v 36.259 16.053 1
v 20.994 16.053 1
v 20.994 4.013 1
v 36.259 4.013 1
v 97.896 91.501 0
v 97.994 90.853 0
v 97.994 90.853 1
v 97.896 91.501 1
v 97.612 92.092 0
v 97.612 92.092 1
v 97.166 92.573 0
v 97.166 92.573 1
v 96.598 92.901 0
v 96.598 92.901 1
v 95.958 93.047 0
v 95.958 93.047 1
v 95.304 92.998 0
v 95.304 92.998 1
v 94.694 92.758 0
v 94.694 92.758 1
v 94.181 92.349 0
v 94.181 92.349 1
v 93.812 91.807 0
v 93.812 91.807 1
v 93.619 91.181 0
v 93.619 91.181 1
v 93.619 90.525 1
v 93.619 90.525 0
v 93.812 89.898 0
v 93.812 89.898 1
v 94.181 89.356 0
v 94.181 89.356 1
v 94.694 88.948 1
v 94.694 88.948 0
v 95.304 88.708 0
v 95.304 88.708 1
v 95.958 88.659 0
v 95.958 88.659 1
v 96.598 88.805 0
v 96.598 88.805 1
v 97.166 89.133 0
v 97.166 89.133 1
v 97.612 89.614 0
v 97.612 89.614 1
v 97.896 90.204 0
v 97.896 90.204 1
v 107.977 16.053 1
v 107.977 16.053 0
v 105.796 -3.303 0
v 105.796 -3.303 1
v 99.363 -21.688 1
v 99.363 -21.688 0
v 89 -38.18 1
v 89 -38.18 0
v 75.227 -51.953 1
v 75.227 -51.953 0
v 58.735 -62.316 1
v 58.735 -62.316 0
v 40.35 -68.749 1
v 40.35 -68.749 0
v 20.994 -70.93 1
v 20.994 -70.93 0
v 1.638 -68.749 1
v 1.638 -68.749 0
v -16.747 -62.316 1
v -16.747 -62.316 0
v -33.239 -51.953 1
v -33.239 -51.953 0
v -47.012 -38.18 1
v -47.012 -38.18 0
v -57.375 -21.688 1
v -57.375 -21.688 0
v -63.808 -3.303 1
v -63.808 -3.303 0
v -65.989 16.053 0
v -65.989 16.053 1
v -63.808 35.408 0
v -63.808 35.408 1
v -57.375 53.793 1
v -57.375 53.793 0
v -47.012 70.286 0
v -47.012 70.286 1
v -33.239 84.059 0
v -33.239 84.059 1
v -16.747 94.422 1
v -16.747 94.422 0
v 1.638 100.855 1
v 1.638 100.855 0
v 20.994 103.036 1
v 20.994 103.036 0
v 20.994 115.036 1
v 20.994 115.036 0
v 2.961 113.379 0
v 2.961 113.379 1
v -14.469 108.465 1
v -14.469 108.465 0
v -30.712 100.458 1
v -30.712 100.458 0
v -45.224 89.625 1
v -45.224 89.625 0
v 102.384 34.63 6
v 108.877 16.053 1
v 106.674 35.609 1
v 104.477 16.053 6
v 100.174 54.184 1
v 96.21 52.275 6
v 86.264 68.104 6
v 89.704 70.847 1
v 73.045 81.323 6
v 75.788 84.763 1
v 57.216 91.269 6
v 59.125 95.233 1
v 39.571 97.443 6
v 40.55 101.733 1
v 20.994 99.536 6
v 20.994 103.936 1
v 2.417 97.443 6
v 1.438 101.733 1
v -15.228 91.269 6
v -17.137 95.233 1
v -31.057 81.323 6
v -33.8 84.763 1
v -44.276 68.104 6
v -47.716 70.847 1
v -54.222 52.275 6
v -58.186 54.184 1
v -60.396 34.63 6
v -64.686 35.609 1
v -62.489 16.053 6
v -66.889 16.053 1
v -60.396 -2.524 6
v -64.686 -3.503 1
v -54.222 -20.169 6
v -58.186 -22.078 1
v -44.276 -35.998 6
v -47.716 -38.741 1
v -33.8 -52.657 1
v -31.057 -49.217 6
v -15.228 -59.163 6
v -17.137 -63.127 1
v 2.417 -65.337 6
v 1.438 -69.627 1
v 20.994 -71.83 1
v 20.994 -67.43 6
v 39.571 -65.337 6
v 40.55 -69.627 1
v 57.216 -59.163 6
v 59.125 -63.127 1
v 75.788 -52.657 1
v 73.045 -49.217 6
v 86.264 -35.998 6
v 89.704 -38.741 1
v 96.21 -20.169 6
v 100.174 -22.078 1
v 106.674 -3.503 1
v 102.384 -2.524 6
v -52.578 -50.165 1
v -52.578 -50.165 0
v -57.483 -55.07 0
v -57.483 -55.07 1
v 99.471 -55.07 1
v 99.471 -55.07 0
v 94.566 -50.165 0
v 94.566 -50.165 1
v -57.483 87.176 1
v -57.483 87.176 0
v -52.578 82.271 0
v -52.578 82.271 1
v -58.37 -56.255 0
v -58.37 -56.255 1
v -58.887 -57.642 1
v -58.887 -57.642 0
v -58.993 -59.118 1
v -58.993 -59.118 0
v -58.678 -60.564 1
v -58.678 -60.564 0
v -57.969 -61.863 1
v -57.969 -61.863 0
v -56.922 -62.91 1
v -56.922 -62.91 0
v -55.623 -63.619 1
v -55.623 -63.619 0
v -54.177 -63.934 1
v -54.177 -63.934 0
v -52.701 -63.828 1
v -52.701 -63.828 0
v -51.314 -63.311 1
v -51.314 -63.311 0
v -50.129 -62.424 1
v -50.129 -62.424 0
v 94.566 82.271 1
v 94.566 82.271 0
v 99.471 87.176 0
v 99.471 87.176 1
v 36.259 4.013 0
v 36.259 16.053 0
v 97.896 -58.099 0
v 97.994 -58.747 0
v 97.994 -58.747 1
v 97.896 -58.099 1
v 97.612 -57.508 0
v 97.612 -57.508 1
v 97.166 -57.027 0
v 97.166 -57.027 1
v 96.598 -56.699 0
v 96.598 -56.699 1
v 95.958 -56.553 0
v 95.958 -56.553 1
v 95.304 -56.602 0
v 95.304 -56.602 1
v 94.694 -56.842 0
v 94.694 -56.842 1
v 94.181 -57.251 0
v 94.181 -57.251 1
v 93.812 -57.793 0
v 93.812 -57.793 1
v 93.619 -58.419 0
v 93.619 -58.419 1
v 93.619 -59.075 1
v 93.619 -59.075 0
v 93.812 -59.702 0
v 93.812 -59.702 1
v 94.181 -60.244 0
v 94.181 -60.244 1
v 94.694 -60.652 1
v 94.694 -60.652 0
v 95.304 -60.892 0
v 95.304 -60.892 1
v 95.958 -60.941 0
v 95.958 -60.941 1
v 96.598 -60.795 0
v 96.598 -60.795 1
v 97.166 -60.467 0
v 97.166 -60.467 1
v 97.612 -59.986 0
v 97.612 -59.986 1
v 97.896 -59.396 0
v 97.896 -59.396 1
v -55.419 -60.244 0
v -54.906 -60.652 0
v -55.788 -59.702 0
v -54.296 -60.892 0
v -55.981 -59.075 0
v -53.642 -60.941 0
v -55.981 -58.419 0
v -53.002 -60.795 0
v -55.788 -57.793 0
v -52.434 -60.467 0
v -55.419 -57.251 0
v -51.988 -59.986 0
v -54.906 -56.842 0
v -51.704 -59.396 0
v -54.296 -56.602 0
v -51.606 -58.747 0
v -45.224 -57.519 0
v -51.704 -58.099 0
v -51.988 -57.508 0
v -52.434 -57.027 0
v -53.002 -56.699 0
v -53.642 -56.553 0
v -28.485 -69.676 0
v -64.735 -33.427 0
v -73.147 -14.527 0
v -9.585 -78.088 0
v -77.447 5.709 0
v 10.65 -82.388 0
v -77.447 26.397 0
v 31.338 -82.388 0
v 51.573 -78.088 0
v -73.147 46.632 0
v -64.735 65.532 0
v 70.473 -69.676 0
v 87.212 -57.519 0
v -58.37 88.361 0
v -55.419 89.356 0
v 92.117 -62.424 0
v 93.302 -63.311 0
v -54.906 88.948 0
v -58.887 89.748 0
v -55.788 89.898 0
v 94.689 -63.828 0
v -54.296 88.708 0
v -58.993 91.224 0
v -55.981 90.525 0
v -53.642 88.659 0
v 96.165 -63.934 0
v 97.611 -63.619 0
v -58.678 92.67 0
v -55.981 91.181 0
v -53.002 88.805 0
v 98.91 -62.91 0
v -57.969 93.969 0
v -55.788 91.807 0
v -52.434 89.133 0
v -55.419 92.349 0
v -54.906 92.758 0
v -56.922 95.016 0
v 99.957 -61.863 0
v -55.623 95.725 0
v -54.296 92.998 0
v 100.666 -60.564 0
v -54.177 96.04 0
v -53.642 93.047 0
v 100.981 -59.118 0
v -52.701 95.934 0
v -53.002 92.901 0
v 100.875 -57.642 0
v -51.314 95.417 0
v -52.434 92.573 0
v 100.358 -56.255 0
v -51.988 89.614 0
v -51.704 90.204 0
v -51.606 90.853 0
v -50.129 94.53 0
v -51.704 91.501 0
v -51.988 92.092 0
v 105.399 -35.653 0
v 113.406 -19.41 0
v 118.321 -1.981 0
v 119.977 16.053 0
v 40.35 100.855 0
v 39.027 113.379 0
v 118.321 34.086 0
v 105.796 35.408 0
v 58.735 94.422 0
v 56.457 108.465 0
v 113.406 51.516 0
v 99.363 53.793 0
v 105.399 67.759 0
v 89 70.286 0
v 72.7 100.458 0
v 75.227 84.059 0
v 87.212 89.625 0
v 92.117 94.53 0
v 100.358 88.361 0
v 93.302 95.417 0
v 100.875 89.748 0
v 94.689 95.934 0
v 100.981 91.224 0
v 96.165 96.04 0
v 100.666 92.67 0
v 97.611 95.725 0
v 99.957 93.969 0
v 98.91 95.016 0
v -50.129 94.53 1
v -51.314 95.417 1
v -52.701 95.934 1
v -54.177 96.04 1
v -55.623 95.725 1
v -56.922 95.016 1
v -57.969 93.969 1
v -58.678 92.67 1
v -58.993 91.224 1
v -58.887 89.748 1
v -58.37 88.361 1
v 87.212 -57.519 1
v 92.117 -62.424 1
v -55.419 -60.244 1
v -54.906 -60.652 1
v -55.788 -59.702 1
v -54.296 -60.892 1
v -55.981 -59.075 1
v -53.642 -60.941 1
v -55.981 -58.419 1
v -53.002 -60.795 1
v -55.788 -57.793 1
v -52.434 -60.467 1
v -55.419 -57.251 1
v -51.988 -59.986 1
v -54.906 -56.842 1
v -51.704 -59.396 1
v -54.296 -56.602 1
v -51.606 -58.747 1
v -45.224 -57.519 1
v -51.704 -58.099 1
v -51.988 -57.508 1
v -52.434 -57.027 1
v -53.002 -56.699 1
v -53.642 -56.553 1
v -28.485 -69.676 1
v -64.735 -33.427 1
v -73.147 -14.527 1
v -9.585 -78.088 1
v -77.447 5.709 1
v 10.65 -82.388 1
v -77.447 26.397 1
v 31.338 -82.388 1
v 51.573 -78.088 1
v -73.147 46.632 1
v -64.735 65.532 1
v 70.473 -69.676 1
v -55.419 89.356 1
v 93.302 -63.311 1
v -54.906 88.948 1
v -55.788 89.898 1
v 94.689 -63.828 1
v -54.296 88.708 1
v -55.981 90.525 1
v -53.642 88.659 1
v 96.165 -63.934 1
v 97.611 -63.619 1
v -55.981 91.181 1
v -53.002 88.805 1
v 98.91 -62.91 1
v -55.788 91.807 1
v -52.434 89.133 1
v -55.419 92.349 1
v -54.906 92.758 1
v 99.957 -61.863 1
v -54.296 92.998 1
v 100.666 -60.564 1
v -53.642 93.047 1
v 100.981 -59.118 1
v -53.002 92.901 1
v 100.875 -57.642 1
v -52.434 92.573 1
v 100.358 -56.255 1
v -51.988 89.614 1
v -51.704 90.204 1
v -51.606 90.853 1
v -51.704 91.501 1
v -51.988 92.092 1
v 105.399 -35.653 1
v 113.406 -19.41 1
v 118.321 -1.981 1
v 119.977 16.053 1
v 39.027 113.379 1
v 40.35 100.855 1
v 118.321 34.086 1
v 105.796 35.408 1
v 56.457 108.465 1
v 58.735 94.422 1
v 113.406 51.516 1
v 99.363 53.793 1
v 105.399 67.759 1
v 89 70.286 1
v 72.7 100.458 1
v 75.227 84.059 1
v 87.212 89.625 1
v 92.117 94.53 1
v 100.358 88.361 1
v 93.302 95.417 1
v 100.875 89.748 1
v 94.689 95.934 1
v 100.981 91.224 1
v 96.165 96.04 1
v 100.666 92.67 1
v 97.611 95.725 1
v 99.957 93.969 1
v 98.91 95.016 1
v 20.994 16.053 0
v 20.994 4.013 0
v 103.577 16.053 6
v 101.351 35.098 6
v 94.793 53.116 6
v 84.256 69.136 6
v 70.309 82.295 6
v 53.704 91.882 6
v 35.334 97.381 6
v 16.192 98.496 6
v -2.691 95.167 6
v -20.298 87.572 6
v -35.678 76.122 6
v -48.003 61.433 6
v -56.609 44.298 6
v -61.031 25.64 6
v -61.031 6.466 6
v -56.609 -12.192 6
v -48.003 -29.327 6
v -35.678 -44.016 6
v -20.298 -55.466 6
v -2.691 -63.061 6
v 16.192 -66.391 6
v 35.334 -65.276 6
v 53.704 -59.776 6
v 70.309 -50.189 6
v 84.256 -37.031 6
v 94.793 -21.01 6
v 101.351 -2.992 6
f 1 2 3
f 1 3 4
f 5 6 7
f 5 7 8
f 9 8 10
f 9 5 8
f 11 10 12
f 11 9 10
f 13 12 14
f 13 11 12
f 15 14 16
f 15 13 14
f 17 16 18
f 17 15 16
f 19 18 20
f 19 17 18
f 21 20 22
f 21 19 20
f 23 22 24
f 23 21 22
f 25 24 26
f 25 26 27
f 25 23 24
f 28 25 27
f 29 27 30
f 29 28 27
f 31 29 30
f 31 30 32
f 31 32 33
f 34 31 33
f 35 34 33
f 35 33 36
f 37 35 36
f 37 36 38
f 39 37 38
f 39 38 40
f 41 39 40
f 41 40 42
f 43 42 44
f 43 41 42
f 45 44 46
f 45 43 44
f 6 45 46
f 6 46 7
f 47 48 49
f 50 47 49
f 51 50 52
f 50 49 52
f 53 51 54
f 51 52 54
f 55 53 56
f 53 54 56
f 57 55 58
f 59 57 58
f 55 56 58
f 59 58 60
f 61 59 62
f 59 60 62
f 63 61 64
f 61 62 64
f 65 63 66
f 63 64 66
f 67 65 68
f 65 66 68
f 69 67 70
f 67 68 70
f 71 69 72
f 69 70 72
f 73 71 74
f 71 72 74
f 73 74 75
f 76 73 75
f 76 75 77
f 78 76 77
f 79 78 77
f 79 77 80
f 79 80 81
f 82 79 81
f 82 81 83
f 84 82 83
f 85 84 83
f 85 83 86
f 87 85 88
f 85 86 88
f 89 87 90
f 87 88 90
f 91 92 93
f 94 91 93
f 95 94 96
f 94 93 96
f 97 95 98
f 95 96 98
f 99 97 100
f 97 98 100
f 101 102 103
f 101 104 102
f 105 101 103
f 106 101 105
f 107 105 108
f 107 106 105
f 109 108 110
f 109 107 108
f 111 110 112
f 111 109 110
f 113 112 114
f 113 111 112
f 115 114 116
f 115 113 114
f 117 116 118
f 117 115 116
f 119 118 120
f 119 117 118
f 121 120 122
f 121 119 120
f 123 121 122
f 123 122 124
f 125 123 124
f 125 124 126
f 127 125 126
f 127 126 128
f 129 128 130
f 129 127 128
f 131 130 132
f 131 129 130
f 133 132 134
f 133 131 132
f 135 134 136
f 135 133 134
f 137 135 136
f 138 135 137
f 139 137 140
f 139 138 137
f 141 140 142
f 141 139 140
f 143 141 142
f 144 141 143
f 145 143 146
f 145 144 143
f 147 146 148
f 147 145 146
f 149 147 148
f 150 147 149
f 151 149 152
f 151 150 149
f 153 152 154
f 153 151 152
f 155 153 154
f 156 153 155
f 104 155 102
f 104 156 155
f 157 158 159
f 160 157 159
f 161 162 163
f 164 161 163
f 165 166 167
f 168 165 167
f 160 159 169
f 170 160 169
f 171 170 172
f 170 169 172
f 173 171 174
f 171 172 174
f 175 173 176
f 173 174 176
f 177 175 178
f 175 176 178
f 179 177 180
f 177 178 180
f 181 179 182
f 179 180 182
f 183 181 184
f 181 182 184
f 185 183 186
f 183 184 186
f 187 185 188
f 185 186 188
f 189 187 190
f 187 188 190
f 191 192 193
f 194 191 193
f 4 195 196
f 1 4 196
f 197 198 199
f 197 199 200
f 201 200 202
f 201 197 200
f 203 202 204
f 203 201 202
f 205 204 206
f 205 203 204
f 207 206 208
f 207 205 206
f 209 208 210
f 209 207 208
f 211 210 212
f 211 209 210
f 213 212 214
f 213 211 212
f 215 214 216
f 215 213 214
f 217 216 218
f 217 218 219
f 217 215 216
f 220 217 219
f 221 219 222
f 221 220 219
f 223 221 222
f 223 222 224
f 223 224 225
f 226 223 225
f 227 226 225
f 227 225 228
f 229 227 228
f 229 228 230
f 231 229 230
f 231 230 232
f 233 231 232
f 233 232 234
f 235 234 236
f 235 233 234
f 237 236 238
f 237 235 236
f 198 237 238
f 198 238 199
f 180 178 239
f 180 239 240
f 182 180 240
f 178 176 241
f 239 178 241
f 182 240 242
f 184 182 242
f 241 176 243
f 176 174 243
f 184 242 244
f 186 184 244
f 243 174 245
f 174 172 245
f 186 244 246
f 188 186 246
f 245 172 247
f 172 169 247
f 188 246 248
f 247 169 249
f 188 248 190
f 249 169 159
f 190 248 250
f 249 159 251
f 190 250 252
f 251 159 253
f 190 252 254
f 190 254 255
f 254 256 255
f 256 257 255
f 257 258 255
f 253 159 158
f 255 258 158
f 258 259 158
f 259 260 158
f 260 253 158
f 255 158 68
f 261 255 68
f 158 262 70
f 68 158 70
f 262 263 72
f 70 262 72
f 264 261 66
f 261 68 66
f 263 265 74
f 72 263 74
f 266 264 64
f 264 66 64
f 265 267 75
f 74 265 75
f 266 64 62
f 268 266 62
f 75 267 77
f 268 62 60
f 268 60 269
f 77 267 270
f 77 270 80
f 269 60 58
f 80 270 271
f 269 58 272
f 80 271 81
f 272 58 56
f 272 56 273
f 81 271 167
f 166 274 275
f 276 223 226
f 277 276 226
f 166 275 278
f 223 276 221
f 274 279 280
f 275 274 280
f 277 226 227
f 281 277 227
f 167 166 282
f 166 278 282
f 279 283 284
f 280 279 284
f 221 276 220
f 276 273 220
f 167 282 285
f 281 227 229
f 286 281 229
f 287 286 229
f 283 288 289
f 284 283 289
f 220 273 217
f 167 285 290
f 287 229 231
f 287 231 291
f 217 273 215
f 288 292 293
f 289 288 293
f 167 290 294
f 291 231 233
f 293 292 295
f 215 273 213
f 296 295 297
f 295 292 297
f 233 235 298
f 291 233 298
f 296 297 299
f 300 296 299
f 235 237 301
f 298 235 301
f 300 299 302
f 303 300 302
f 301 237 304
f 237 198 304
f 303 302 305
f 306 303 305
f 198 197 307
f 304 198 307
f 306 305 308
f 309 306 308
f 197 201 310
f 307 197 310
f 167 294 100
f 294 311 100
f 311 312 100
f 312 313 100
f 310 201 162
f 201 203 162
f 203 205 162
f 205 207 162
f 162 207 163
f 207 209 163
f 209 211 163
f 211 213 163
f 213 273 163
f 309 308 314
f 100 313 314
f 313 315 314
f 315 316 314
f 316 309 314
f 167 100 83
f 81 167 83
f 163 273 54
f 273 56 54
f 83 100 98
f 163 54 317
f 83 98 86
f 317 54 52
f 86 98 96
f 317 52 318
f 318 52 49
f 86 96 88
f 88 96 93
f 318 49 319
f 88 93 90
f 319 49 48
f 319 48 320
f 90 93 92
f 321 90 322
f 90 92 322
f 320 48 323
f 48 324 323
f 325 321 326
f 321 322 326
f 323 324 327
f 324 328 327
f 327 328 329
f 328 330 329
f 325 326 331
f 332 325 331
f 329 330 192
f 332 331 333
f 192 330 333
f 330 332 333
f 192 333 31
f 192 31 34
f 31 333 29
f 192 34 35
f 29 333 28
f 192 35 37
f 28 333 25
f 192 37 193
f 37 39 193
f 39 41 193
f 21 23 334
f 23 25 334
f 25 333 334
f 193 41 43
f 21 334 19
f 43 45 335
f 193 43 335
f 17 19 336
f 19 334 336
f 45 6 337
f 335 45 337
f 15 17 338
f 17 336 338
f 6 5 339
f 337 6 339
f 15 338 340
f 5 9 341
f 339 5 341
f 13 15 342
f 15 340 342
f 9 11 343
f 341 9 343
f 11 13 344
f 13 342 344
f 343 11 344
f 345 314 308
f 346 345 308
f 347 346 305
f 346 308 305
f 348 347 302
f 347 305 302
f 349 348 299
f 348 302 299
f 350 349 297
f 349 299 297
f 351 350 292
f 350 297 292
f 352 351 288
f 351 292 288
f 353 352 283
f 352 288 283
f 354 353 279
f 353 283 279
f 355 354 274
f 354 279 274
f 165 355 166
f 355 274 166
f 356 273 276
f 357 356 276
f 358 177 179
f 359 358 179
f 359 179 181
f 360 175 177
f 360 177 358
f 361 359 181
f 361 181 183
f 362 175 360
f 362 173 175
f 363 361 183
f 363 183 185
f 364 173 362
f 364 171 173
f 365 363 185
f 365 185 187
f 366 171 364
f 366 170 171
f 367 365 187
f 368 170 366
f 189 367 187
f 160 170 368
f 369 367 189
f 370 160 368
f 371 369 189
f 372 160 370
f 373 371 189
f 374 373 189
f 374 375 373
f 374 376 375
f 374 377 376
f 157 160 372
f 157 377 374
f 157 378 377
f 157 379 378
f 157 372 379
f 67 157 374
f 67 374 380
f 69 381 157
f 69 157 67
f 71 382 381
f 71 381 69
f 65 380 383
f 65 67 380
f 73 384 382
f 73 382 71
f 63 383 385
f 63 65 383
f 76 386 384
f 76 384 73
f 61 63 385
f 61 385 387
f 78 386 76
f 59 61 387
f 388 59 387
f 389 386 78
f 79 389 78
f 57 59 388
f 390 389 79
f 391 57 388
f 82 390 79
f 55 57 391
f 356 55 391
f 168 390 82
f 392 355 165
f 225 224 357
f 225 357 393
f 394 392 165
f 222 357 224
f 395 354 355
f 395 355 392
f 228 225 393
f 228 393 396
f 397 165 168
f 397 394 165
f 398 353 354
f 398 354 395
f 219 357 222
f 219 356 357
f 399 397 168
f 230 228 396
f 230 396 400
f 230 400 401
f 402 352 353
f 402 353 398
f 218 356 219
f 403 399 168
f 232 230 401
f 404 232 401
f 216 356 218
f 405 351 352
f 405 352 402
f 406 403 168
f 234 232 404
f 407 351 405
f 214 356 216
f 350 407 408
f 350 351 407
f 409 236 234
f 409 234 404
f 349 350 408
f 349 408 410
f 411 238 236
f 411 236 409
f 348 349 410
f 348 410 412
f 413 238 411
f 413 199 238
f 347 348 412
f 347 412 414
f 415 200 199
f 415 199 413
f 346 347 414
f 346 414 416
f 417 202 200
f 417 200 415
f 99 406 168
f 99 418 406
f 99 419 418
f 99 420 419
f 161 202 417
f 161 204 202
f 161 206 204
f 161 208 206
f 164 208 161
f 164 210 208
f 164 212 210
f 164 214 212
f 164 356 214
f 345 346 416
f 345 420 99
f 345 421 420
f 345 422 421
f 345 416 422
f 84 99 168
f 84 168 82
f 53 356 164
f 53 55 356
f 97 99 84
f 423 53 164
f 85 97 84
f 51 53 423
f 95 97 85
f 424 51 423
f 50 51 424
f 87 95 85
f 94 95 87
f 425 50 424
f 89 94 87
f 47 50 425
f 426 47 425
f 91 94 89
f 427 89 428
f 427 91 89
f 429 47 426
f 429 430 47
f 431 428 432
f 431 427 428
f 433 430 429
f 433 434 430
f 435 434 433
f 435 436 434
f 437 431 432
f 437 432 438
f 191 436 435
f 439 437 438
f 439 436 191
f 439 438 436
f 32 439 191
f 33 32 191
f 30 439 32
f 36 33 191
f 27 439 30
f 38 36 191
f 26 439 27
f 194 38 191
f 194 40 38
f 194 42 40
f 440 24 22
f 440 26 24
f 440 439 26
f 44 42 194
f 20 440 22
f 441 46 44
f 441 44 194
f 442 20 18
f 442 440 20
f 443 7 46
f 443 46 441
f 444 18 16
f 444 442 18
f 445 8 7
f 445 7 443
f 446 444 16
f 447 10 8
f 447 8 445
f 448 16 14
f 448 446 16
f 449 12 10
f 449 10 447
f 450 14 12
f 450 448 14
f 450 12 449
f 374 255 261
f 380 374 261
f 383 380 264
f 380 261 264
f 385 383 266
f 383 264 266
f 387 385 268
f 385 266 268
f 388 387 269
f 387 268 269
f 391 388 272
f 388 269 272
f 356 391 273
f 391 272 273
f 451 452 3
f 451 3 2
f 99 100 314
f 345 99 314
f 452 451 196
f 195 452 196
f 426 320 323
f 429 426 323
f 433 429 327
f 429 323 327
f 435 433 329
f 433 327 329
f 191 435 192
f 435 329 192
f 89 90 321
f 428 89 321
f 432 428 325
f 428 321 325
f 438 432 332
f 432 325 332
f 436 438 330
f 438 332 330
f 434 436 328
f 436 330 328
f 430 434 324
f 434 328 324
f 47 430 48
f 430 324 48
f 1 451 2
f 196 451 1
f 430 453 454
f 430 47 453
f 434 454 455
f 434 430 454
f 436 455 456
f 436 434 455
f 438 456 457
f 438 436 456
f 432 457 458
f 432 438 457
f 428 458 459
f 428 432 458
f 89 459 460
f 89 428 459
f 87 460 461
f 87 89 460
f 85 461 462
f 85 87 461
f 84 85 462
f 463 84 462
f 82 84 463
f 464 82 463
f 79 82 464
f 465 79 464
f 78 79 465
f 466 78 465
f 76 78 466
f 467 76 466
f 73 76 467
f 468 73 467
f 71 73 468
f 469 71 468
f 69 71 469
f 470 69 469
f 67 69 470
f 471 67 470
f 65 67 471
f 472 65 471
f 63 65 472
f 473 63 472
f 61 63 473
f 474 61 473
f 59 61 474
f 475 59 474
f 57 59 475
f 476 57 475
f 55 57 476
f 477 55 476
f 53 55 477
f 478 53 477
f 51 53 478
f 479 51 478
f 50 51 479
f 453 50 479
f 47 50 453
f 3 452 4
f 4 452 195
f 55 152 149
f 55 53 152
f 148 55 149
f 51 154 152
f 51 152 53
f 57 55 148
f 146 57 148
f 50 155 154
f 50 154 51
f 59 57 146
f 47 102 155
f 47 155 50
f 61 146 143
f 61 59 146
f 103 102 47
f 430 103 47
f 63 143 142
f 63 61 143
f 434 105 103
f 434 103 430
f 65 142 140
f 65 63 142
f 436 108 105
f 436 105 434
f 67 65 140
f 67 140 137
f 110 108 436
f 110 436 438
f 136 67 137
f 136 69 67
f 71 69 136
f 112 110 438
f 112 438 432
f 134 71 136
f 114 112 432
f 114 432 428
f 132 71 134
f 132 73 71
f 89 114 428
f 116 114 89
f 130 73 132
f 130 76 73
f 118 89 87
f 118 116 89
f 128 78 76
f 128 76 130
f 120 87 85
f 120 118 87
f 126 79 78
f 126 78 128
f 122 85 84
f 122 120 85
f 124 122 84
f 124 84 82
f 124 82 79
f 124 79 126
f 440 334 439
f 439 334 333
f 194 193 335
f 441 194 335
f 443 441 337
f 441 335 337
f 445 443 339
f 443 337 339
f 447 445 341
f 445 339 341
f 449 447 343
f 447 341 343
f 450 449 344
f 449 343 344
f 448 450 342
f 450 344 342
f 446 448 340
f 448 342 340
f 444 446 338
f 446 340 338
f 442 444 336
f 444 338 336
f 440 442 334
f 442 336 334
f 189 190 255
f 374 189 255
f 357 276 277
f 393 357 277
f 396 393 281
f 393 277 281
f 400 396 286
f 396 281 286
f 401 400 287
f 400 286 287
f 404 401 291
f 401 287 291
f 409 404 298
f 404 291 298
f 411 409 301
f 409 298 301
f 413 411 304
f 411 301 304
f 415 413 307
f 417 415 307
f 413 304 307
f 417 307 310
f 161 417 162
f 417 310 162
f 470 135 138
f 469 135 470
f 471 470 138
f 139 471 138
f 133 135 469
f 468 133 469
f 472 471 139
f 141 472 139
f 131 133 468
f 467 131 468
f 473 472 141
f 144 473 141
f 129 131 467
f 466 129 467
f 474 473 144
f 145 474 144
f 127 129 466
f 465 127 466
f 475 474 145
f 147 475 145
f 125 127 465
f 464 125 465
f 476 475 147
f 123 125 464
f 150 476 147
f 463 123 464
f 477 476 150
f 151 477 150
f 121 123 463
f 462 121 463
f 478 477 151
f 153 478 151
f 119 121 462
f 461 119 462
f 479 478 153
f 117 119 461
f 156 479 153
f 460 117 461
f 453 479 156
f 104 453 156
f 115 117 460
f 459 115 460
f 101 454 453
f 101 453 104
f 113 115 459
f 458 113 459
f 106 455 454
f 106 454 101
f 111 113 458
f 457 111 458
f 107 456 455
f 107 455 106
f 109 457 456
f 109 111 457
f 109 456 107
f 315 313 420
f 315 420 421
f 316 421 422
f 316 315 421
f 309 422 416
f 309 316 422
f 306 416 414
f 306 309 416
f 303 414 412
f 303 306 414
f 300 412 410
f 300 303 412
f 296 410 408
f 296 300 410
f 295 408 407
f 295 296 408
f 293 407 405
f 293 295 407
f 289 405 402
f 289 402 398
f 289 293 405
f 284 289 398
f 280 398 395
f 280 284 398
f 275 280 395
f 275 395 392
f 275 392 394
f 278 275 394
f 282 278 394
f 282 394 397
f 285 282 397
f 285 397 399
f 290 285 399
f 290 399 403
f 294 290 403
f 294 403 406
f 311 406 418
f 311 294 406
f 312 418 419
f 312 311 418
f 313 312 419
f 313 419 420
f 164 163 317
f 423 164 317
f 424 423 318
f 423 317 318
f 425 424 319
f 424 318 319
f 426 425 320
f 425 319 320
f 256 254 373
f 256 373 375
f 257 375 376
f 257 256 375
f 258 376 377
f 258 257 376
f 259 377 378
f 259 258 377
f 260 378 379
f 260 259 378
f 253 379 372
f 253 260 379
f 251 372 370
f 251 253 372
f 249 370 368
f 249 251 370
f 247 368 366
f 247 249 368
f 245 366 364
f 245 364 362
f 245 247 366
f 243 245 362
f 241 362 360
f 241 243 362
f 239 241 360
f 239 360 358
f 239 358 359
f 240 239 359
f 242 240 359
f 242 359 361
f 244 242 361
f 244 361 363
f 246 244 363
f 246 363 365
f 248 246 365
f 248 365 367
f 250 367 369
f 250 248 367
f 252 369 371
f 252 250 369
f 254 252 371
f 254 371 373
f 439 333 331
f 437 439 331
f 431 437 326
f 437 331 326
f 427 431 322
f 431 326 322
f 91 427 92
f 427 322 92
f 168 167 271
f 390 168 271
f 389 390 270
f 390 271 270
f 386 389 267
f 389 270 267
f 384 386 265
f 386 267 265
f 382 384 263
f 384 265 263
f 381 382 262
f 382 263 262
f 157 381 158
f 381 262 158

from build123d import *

# Parameters (mm, degrees)
F0_R     = 2.2
F1_DEPTH = 1
F0_W     = 15.265275
F0_H     = 12.039403
F3_DEPTH = 1


with BuildPart() as f1:
    # F0 (on Top) → F1 (new body)
    with BuildSketch(Plane.XY):
        with BuildLine():
            Line((94.565999, 82.270926), (99.470974, 87.175902))
            ThreePointArc((99.470974, 87.175902), (99.470974, 94.529813), (92.117064, 94.529813))
            Line((92.117064, 94.529813), (87.212088, 89.624837))
            ThreePointArc((87.212088, 89.624837), (56.457245, 108.465132), (20.994019, 115.036032))
            Line((20.994019, 115.036032), (20.994019, 103.036032))
            ThreePointArc((20.994019, 103.036032), (82.500412, 77.55925), (107.977194, 16.052857))
            Line((107.977194, 16.052857), (119.977194, 16.052857))
            ThreePointArc((119.977194, 16.052857), (113.406294, 51.516083), (94.565999, 82.270926))
        make_face()
        with Locations((95.794019, 90.852857)):
            Circle(F0_R, mode=Mode.SUBTRACT)
    extrude(amount=F1_DEPTH)

    # F0 (on Top) → F3 (join)
    with BuildSketch(Plane.XY):
        with BuildLine():
            Line((94.565999, 82.270926), (99.470974, 87.175902))
            ThreePointArc((99.470974, 87.175902), (99.470974, 94.529813), (92.117064, 94.529813))
            Line((92.117064, 94.529813), (87.212088, 89.624837))
            ThreePointArc((87.212088, 89.624837), (56.457245, 108.465132), (20.994019, 115.036032))
            Line((20.994019, 115.036032), (20.994019, 103.036032))
            ThreePointArc((20.994019, 103.036032), (82.500412, 77.55925), (107.977194, 16.052857))
            Line((107.977194, 16.052857), (119.977194, 16.052857))
            ThreePointArc((119.977194, 16.052857), (113.406294, 51.516083), (94.565999, 82.270926))
        make_face()
        with Locations((95.794019, 90.852857)):
            Circle(F0_R, mode=Mode.SUBTRACT)
        with BuildLine():
            ThreePointArc((94.565999, -50.165212), (113.406294, -19.410368), (119.977194, 16.052857))
            Line((119.977194, 16.052857), (107.977194, 16.052857))
            ThreePointArc((107.977194, 16.052857), (-40.512373, -45.453535), (20.994019, 103.036032))
            Line((20.994019, 103.036032), (20.994019, 115.036032))
            ThreePointArc((20.994019, 115.036032), (-14.469206, 108.465132), (-45.22405, 89.624837))
            Line((-45.22405, 89.624837), (-50.129026, 94.529813))
            ThreePointArc((-50.129026, 94.529813), (-57.482936, 94.529813), (-57.482936, 87.175902))
            Line((-57.482936, 87.175902), (-52.57796, 82.270926))
            ThreePointArc((-52.57796, 82.270926), (-77.989155, 16.052857), (-52.57796, -50.165212))
            Line((-52.57796, -50.165212), (-57.482936, -55.070187))
            ThreePointArc((-57.482936, -55.070187), (-57.482936, -62.424098), (-50.129026, -62.424098))
            Line((-50.129026, -62.424098), (-45.22405, -57.519122))
            ThreePointArc((-45.22405, -57.519122), (20.994019, -82.930317), (87.212088, -57.519122))
            Line((87.212088, -57.519122), (92.117064, -62.424098))
            ThreePointArc((92.117064, -62.424098), (99.470974, -62.424098), (99.470974, -55.070187))
            Line((99.470974, -55.070187), (94.565999, -50.165212))
        make_face()
        with Locations((-53.805981, -58.747143)):
            Circle(F0_R, mode=Mode.SUBTRACT)
        with Locations((95.794019, -58.747143)):
            Circle(F0_R, mode=Mode.SUBTRACT)
        with Locations((-53.805981, 90.852857)):
            Circle(F0_R, mode=Mode.SUBTRACT)
        with Locations((28.626656, 10.033155)):
            Rectangle(F0_W, F0_H)
    extrude(amount=F3_DEPTH)


with BuildPart() as f4:
    # F2 (on face) → F4 (revolve)
    with BuildSketch(Plane.XZ.offset(-16.052857)):
        Polygon((108.877194, 1), (104.477194, 6), (103.577194, 6), (107.977194, 1), align=None)
    revolve(axis=Axis((20.994019, 16.052857, 0.5), (0, 0, 1)))


solid = Compound([f1.part, f4.part])
